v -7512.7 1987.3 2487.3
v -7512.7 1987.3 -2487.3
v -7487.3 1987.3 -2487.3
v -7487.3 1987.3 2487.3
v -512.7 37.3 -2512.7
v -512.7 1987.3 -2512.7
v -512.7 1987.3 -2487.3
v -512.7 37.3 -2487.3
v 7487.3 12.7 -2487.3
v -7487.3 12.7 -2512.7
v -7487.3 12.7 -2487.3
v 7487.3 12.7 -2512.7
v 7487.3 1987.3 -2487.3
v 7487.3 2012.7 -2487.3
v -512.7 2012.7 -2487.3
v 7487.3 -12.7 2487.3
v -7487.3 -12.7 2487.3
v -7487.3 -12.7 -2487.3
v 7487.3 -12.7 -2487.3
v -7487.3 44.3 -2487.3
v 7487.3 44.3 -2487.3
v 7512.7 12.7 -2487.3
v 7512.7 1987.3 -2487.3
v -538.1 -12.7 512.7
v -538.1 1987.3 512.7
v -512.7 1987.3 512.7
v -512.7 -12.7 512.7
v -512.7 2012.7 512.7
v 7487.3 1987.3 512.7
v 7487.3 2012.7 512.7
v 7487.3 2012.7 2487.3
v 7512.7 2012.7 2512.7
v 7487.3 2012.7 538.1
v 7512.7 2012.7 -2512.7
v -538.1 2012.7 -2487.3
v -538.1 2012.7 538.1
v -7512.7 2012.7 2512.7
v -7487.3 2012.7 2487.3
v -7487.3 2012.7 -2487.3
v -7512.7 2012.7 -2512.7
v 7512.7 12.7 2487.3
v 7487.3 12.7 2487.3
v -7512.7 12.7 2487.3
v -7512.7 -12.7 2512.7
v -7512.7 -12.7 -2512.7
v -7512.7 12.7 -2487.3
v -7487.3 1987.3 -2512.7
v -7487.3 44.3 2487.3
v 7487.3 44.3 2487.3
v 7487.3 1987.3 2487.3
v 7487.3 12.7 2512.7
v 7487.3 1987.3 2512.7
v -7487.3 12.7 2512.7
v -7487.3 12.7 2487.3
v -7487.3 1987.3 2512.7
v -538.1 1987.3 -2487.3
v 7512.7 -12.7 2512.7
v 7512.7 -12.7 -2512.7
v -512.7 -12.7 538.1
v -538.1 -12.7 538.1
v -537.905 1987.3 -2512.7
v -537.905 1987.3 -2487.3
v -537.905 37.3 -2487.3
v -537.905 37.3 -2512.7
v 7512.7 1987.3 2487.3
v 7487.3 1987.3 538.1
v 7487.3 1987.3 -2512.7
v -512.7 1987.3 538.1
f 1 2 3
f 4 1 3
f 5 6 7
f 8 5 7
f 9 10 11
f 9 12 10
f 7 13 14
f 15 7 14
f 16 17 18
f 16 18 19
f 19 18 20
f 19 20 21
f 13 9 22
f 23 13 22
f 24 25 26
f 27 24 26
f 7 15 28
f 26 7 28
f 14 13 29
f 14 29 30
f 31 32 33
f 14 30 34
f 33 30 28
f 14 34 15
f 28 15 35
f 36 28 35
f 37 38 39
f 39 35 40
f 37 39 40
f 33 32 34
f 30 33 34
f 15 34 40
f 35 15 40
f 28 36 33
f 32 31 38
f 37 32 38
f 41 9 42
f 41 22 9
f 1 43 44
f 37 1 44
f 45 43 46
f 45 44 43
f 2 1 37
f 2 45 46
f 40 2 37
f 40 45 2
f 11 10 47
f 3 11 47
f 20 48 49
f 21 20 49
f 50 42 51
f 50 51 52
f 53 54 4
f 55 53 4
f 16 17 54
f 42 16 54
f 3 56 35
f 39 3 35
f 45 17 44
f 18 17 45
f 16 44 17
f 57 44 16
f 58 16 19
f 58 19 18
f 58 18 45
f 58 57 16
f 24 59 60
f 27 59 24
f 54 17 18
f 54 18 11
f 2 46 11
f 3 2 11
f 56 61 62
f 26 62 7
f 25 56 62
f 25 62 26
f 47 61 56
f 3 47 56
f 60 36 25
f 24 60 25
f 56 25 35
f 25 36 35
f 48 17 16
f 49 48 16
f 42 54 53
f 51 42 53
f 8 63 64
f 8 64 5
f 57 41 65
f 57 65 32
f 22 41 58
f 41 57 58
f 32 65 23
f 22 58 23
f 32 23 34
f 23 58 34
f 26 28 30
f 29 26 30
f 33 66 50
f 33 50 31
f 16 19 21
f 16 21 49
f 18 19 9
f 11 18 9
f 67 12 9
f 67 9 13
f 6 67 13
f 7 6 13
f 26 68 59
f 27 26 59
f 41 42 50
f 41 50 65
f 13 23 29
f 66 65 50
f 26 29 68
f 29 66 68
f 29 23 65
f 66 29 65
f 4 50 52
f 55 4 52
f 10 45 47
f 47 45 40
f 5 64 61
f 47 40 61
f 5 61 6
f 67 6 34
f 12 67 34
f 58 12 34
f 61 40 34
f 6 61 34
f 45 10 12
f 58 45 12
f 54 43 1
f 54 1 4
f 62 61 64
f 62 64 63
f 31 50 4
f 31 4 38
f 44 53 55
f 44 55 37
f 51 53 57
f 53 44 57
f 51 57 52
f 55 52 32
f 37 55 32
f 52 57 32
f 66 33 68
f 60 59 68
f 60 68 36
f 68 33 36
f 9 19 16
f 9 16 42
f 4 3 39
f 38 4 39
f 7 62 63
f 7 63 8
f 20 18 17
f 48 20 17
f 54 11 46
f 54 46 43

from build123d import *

# Parameters (mm, degrees)
CROQUIS2_W              = 25.4
CROQUIS2_H              = 25.4
CROQUIS3_W              = 25.4
CROQUIS3_H              = 25.4
SALIENTE_EXTRUIR1_DEPTH = 2000
CROQUIS4_W              = 25.4
CROQUIS4_H              = 25.4
SALIENTE_EXTRUIR2_DEPTH = 4993
CROQUIS5_W              = 25.4
CROQUIS5_H              = 25.4
SALIENTE_EXTRUIR3_DEPTH = 14977
SALIENTE_EXTRUIR5_REACH = 8178.587
CROQUIS9_W              = 3000
CROQUIS9_H              = 2000
CORTAR_EXTRUIR2_DEPTH   = 3769
CORTAR_EXTRUIR3_DEPTH   = 1551
CROQUIS12_W             = 14974.6
CROQUIS12_H             = 4974.6
SALIENTE_EXTRUIR7_DEPTH = 57
CROQUIS13_W             = 25.205134762
CROQUIS13_H             = 25.4
SALIENTE_EXTRUIR8_DEPTH = 1950


with BuildPart() as part:
    # Barrer1: sweep along a path in Croquis1
    with BuildLine(Plane(origin=(0, 0, 0), x_dir=(1, 0, 0), z_dir=(0, 1, 0))) as barrer1_path:
        Line((-7500, -2500), (7500, -2500))
        Line((7500, -2500), (7500, 2500))
        Line((7500, 2500), (-7500, 2500))
        Line((-7500, 2500), (-7500, -2500))
    # Croquis2 → Barrer1 (sweep)
    with BuildSketch(Plane(origin=(0, 0, 0), x_dir=(0, 0, -1), z_dir=(1, 0, 0))):
        with Locations((-2500, 0)):
            Rectangle(CROQUIS2_W, CROQUIS2_H)
    sweep(path=barrer1_path.line, transition=Transition.RIGHT)

    # Croquis3 → Saliente-Extruir1 (add)
    with BuildSketch(Plane(origin=(0, 12.7, 0), x_dir=(1, 0, 0), z_dir=(0, 1, 0))):
        with Locations((-7500, 2500)):
            Rectangle(CROQUIS3_W, CROQUIS3_H)
        with Locations((-7500, -2500)):
            Rectangle(CROQUIS3_W, CROQUIS3_H)
        with Locations((7500, -2500)):
            Rectangle(CROQUIS3_W, CROQUIS3_H)
        with Locations((7500, 2500)):
            Rectangle(CROQUIS3_W, CROQUIS3_H)
    extrude(amount=SALIENTE_EXTRUIR1_DEPTH)

    # Croquis4 → Saliente-Extruir2 (add)
    with BuildSketch(Plane.XY.offset(-2487.3)):
        with Locations((-7500, 2000)):
            Rectangle(CROQUIS4_W, CROQUIS4_H)
    saliente_extruir2 = extrude(amount=SALIENTE_EXTRUIR2_DEPTH)

    # Simetría1: Saliente-Extruir2 across plane
    add(saliente_extruir2.mirror(Plane(origin=(0, 0, 0), x_dir=(0, 0, 1), z_dir=(1, 0, 0))))

    # Croquis5 → Saliente-Extruir3 (add)
    with BuildSketch(Plane.ZY.offset(-7487.3)):
        with Locations((2500, 2000)):
            Rectangle(CROQUIS5_W, CROQUIS5_H)
        with Locations((-2500, 2000)):
            Rectangle(CROQUIS5_W, CROQUIS5_H)
    extrude(amount=SALIENTE_EXTRUIR3_DEPTH)

    # Saliente-Extruir5: up to this face of the body (flat: up to its plane)
    saliente_extruir5_end = Plane(part.part.faces().sort_by_distance((0, -12.7, 2496.856474814))[0])
    # Croquis8 → Saliente-Extruir5 (add, up to the picked face)
    with BuildSketch(Plane(origin=(0, 2012.7, 0), x_dir=(1, 0, 0), z_dir=(0, 1, 0)), mode=Mode.PRIVATE) as saliente_extruir5_sk1:
        Polygon((-512.7, 2487.3), (-512.7, -512.7), (7487.3, -512.7), (7487.3, -538.1), (-538.1, -538.1), (-538.1, 2487.3), align=None)
    saliente_extruir5_tool1 = split(extrude(saliente_extruir5_sk1.sketch, amount=-SALIENTE_EXTRUIR5_REACH, mode=Mode.PRIVATE), bisect_by=saliente_extruir5_end, keep=Keep.BOTH, mode=Mode.PRIVATE)
    add(saliente_extruir5_tool1.solids().sort_by(Axis((-521.276718, 2012.7, -987.3), (0, -1, 0)))[0])

    # Croquis9 → Cortar-Extruir2 (cut)
    with BuildSketch(Plane.ZY.offset(538.1)):
        with Locations((-987.3, 987.3)):
            Rectangle(CROQUIS9_W, CROQUIS9_H)
    extrude(amount=-CORTAR_EXTRUIR2_DEPTH, mode=Mode.SUBTRACT)

    # Croquis11 → Cortar-Extruir3 (cut)
    with BuildSketch(Plane.XY.offset(538.1)):
        Polygon((-512.7, 1987.3), (-512.7, 12.7), (-512.7, -12.7), (7487.3, -12.7), (7487.3, 1987.3), align=None)
    extrude(amount=-CORTAR_EXTRUIR3_DEPTH, mode=Mode.SUBTRACT)

    # Croquis13 → Saliente-Extruir8 (add)
    with BuildSketch(Plane.XZ.offset(-1987.3)):
        with Locations((-525.302567381, -2500)):
            Rectangle(CROQUIS13_W, CROQUIS13_H)
    extrude(amount=SALIENTE_EXTRUIR8_DEPTH)


with BuildPart() as body_2:
    # Croquis12 → Saliente-Extruir7 (new body)
    with BuildSketch(Plane.XZ.offset(12.7)):
        Rectangle(CROQUIS12_W, CROQUIS12_H)
    extrude(amount=-SALIENTE_EXTRUIR7_DEPTH)


solid = Compound([part.part, body_2.part])
